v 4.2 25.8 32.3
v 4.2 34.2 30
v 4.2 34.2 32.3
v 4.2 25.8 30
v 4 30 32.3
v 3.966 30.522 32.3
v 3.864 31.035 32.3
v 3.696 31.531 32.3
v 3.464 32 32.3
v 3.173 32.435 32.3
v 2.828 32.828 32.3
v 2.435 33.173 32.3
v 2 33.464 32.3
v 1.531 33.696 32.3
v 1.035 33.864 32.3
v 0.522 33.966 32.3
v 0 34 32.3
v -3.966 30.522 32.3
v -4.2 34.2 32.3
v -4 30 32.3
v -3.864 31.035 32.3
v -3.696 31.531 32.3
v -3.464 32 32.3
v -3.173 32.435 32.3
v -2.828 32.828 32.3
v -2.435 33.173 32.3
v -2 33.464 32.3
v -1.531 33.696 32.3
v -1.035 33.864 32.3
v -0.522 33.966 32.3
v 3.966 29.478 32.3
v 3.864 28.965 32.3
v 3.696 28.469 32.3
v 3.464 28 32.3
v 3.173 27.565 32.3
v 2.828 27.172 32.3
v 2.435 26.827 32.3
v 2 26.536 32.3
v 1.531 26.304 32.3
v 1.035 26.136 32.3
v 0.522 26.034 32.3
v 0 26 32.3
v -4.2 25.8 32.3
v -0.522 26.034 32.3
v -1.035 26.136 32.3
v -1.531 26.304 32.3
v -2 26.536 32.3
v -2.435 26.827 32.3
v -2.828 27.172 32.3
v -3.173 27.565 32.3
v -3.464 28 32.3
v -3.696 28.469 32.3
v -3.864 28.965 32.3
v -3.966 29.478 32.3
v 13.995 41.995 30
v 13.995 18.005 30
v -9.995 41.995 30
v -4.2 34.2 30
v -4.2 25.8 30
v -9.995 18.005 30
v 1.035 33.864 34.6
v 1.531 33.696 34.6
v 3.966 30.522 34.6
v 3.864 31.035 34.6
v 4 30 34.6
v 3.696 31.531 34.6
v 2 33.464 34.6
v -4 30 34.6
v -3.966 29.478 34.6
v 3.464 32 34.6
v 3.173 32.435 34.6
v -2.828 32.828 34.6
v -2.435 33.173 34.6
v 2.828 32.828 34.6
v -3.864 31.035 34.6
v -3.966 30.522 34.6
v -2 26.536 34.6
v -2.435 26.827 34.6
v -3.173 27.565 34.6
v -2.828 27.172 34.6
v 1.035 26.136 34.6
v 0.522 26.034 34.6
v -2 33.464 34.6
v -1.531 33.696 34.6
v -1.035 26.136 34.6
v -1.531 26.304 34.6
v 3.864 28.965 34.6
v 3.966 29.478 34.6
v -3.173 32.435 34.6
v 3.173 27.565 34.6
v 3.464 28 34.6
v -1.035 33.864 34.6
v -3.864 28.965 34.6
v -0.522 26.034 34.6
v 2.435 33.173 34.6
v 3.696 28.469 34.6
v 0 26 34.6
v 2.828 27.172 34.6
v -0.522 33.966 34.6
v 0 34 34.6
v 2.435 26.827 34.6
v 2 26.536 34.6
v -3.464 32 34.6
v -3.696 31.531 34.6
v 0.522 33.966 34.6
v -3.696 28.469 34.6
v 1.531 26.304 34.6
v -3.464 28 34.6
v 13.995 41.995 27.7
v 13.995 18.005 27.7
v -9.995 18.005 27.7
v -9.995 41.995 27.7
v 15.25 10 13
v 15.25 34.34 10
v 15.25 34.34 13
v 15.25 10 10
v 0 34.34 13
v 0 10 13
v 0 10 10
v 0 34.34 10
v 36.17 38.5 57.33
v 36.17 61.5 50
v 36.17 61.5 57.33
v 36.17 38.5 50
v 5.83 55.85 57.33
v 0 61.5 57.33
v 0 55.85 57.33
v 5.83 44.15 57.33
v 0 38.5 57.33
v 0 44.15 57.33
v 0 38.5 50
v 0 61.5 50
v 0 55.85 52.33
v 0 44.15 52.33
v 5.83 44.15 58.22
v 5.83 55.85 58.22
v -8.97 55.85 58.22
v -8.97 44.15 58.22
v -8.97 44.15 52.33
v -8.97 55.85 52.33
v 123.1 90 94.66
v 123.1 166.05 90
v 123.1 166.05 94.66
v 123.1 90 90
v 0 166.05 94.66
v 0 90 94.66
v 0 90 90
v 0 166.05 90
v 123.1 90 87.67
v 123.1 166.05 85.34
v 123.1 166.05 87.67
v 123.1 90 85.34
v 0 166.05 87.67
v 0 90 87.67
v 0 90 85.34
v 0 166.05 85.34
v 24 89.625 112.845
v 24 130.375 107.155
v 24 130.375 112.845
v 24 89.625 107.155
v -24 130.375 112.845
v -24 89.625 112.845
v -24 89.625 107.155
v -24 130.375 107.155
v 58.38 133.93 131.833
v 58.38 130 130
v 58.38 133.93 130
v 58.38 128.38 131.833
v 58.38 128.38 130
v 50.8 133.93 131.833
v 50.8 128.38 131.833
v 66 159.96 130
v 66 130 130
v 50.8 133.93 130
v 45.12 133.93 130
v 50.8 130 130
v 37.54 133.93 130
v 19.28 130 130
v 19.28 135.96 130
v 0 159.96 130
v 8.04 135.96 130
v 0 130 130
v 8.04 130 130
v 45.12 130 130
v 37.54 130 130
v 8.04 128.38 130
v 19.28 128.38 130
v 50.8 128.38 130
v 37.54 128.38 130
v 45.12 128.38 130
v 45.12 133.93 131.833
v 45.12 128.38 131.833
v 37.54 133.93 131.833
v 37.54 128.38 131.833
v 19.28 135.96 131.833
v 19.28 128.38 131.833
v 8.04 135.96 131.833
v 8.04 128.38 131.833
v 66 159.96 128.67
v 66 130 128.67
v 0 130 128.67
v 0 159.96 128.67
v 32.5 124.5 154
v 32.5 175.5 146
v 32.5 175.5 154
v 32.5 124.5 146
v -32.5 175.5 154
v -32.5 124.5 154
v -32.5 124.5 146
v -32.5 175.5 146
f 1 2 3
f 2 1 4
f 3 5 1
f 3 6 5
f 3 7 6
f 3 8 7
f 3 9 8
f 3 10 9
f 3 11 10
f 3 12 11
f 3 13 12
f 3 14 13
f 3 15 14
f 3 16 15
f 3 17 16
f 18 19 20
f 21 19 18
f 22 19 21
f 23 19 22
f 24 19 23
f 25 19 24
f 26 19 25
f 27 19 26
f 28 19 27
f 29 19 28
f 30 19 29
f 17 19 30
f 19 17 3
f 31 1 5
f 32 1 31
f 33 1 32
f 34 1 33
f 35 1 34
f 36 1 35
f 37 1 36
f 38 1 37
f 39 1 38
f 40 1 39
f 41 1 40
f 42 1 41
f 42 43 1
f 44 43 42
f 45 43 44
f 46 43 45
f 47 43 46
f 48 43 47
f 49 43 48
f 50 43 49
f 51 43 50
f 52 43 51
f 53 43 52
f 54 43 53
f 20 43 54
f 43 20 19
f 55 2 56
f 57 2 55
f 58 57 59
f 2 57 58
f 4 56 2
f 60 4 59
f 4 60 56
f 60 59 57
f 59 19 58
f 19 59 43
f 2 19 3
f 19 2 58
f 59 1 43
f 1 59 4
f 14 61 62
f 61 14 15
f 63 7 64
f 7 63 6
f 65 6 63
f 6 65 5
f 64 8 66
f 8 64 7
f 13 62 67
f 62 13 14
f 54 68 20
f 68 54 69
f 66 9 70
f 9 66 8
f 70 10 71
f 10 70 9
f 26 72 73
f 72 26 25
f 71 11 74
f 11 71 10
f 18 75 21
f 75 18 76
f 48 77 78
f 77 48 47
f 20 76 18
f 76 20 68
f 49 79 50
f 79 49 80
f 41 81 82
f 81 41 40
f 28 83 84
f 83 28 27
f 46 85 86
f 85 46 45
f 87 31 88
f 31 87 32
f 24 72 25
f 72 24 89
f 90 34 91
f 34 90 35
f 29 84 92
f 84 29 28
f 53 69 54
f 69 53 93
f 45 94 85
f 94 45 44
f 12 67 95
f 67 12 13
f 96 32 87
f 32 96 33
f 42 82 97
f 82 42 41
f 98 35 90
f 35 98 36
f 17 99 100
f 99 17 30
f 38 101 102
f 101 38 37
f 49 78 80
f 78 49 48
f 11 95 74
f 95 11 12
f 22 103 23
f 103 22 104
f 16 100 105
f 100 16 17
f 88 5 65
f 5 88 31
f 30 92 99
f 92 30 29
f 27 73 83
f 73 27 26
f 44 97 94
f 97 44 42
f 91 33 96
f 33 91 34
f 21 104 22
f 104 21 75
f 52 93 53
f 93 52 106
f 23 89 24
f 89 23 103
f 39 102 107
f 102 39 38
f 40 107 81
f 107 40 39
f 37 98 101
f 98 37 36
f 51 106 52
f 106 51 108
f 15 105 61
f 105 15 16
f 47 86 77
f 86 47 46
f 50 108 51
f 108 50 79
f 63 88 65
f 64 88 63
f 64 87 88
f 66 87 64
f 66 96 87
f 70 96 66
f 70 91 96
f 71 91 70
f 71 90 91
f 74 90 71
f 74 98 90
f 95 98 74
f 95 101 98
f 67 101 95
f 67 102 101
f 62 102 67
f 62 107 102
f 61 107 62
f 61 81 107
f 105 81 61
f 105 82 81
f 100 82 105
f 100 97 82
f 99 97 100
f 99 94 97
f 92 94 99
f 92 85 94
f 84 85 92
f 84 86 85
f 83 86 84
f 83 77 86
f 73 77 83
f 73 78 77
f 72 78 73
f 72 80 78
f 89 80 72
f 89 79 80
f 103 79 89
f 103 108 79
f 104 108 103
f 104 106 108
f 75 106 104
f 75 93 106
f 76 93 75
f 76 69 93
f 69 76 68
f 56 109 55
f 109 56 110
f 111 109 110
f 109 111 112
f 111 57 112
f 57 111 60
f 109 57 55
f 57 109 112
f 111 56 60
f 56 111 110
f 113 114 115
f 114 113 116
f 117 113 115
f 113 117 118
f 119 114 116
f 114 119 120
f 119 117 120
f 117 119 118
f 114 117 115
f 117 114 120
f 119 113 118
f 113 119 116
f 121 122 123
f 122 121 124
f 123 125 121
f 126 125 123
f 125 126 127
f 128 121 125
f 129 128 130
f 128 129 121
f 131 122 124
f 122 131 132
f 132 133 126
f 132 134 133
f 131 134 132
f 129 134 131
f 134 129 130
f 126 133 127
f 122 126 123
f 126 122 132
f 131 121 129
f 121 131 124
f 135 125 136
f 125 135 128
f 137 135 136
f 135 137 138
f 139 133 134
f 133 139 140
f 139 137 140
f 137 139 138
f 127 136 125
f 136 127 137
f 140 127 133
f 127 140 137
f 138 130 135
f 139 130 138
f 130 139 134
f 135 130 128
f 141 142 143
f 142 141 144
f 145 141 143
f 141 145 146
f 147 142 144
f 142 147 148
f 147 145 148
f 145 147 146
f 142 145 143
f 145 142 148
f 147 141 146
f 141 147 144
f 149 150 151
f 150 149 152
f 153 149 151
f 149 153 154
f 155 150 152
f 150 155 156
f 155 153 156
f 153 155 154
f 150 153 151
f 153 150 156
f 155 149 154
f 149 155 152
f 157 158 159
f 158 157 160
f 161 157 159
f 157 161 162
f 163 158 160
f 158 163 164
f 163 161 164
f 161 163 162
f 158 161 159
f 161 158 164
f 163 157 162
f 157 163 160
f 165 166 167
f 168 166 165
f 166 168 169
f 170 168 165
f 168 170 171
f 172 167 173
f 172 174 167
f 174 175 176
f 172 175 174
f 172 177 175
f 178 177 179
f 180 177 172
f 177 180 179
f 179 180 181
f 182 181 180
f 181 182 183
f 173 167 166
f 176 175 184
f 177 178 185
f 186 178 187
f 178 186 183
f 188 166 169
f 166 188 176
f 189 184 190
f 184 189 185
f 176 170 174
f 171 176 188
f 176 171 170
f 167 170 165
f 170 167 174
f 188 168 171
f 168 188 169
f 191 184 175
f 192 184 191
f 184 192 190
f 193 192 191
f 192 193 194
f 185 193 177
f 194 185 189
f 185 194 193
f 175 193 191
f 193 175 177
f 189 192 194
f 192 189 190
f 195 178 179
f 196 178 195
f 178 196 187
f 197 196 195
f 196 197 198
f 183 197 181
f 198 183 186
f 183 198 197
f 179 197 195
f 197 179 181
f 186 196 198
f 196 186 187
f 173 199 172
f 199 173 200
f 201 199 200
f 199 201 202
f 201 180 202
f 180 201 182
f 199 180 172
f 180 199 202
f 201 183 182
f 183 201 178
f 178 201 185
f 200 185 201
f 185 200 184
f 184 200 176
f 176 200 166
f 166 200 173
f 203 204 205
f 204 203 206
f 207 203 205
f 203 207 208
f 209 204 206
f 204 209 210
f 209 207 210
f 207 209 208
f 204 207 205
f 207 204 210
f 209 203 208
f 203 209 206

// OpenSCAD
$fn = 48;

union() {
	union() {
		union() {
			union() {
				union() {
					union() {
						translate(v = [0, 10, 10]) {
							color(c = [0, 0, 1]) {
								cube(size = [15.2500000000, 24.3400000000, 3]);
							}
						}
						translate(v = [0, 30, 30]) {
							union() {
								color(c = [0, 0.5000000000, 0]) {
									translate(v = [0, 0, -2.3000000000]) {
										translate(v = [-9.9950000000, 0, 0]) {
											translate(v = [0, -11.9950000000, 0]) {
												cube(size = [23.9900000000, 23.9900000000, 2.3000000000]);
											}
										}
									}
								}
								color(c = [0, 0, 0]) {
									translate(v = [-4.2000000000, -4.2000000000, 0]) {
										cube(size = [8.4000000000, 8.4000000000, 2.3000000000]);
									}
									translate(v = [0, 0, 2.3000000000]) {
										cylinder(h = 2.3000000000, r1 = 4.0000000000, r2 = 4.0000000000);
									}
								}
							}
						}
					}
					translate(v = [0, 50, 50]) {
						union() {
							color(c = [0, 0.5000000000, 0]) {
								translate(v = [0, -11.5000000000, 0]) {
									cube(size = [36.1700000000, 23.0000000000, 7.3300000000]);
								}
							}
							color(c = [0.8240000000, 0.8240000000, 0.8240000000]) {
								translate(v = [-8.9700000000, 0, 0]) {
									translate(v = [0, 0, 2.3300000000]) {
										translate(v = [0, -5.8500000000, 0]) {
											cube(size = [14.8000000000, 11.7000000000, 5.8900000000]);
										}
									}
								}
							}
						}
					}
				}
				translate(v = [0, 90, 90]) {
					union() {
						color(c = [0.5000000000, 0.5000000000, 0]) {
							cube(size = [123.1000000000, 76.0500000000, 4.6600000000]);
						}
						color(c = [0.8240000000, 0.8240000000, 0.8240000000]) {
							translate(v = [0, 0, -4.6600000000]) {
								cube(size = [123.1000000000, 76.0500000000, 2.3300000000]);
							}
						}
					}
				}
			}
			translate(v = [0, 110, 110]) {
				color(c = [0, 0, 1]) {
					cube(center = true, size = [48.0000000000, 40.7500000000, 5.6900000000]);
				}
			}
		}
		translate(v = [0, 130, 130]) {
			union() {
				union() {
					translate(v = [0, -1.6200000000, 0]) {
						translate(v = [37.5400000000, 0, 0]) {
							union() {
								translate(v = [13.2600000000, 0, 0]) {
									color(c = [0.8240000000, 0.8240000000, 0.8240000000]) {
										cube(size = [7.5800000000, 5.5500000000, 1.8325000000]);
									}
								}
								color(c = [0.8240000000, 0.8240000000, 0.8240000000]) {
									cube(size = [7.5800000000, 5.5500000000, 1.8325000000]);
								}
							}
						}
					}
					translate(v = [0, -1.6200000000, 0]) {
						translate(v = [8.0400000000, 0, 0]) {
							color(c = [0.8240000000, 0.8240000000, 0.8240000000]) {
								cube(size = [11.2400000000, 7.5800000000, 1.8325000000]);
							}
						}
					}
				}
				color(c = [0, 0.5000000000, 0]) {
					translate(v = [0, 0, -1.3300000000]) {
						cube(size = [66.0000000000, 29.9600000000, 1.3300000000]);
					}
				}
			}
		}
	}
	translate(v = [0, 150, 150]) {
		color(c = [0.9500000000, 0.9500000000, 0.9500000000]) {
			cube(center = true, size = [65.0000000000, 51.0000000000, 8.0000000000]);
		}
	}
}
